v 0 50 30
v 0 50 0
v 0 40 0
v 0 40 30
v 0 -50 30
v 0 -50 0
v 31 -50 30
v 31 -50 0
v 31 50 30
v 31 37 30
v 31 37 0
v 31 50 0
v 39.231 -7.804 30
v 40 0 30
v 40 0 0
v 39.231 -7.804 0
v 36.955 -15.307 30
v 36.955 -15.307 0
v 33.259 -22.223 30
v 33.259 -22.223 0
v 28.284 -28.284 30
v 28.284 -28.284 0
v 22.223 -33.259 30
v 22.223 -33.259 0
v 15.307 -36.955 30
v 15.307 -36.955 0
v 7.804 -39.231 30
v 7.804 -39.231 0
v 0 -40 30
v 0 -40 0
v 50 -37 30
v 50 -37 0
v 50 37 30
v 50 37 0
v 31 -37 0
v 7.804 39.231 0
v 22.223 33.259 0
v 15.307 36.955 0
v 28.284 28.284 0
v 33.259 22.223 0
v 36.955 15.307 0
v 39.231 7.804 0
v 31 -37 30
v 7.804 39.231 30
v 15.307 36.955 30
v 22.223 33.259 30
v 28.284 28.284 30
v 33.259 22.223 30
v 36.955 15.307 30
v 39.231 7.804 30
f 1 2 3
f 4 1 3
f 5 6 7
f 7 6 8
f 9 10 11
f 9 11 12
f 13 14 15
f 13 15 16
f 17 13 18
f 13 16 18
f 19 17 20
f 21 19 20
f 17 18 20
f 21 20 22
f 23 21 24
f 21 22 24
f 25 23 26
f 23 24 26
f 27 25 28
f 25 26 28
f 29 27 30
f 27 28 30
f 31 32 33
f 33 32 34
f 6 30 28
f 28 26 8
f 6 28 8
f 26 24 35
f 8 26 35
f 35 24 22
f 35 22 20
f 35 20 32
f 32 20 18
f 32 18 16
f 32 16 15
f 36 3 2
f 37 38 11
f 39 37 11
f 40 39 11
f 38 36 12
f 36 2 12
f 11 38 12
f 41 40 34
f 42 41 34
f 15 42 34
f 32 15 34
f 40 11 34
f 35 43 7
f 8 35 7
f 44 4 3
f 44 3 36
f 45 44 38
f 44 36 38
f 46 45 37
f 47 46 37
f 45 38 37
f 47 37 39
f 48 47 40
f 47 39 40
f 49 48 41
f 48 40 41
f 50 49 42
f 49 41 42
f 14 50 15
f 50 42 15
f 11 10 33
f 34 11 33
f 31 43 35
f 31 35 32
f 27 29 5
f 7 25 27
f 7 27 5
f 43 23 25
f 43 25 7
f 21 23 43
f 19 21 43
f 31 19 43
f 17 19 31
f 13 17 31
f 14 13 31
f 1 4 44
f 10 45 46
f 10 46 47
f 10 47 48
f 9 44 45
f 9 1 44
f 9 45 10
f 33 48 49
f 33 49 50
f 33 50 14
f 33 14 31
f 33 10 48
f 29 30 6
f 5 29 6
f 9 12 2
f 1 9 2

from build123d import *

# Parameters (mm, degrees)
EXTRUDE_1_DEPTH     = 30
SKETCH_2_W          = 19
SKETCH_2_H          = 13
CUT_EXTRUDE_1_DEPTH = 77.811457479


with BuildPart() as part:
    # Эскиз1 → Бобышка-Вытянуть1 (new body)
    with BuildSketch(Plane.XY):
        with BuildLine():
            Line((50, 50), (0, 50))
            Line((0, 50), (0, 40))
            ThreePointArc((0, 40), (28.284271247, 28.284271247), (40, 0))
            ThreePointArc((40, 0), (28.284271247, -28.284271247), (0, -40))
            Line((0, -40), (0, -50))
            Line((0, -50), (50, -50))
            Line((50, -50), (50, 50))
        make_face()
    extrude(amount=EXTRUDE_1_DEPTH)

    # Эскиз2 → Вырез-Вытянуть1 (cut, through all)
    with BuildSketch(Plane.XY.offset(30)):
        with Locations((40.5, 43.5)):
            Rectangle(SKETCH_2_W, SKETCH_2_H)
    cut_extrude_1 = extrude(amount=-CUT_EXTRUDE_1_DEPTH, mode=Mode.SUBTRACT)

    # Зеркальное отражение1: Вырез-Вытянуть1 across plane
    add(cut_extrude_1.mirror(Plane.ZX), mode=Mode.SUBTRACT)


solid = part.part
